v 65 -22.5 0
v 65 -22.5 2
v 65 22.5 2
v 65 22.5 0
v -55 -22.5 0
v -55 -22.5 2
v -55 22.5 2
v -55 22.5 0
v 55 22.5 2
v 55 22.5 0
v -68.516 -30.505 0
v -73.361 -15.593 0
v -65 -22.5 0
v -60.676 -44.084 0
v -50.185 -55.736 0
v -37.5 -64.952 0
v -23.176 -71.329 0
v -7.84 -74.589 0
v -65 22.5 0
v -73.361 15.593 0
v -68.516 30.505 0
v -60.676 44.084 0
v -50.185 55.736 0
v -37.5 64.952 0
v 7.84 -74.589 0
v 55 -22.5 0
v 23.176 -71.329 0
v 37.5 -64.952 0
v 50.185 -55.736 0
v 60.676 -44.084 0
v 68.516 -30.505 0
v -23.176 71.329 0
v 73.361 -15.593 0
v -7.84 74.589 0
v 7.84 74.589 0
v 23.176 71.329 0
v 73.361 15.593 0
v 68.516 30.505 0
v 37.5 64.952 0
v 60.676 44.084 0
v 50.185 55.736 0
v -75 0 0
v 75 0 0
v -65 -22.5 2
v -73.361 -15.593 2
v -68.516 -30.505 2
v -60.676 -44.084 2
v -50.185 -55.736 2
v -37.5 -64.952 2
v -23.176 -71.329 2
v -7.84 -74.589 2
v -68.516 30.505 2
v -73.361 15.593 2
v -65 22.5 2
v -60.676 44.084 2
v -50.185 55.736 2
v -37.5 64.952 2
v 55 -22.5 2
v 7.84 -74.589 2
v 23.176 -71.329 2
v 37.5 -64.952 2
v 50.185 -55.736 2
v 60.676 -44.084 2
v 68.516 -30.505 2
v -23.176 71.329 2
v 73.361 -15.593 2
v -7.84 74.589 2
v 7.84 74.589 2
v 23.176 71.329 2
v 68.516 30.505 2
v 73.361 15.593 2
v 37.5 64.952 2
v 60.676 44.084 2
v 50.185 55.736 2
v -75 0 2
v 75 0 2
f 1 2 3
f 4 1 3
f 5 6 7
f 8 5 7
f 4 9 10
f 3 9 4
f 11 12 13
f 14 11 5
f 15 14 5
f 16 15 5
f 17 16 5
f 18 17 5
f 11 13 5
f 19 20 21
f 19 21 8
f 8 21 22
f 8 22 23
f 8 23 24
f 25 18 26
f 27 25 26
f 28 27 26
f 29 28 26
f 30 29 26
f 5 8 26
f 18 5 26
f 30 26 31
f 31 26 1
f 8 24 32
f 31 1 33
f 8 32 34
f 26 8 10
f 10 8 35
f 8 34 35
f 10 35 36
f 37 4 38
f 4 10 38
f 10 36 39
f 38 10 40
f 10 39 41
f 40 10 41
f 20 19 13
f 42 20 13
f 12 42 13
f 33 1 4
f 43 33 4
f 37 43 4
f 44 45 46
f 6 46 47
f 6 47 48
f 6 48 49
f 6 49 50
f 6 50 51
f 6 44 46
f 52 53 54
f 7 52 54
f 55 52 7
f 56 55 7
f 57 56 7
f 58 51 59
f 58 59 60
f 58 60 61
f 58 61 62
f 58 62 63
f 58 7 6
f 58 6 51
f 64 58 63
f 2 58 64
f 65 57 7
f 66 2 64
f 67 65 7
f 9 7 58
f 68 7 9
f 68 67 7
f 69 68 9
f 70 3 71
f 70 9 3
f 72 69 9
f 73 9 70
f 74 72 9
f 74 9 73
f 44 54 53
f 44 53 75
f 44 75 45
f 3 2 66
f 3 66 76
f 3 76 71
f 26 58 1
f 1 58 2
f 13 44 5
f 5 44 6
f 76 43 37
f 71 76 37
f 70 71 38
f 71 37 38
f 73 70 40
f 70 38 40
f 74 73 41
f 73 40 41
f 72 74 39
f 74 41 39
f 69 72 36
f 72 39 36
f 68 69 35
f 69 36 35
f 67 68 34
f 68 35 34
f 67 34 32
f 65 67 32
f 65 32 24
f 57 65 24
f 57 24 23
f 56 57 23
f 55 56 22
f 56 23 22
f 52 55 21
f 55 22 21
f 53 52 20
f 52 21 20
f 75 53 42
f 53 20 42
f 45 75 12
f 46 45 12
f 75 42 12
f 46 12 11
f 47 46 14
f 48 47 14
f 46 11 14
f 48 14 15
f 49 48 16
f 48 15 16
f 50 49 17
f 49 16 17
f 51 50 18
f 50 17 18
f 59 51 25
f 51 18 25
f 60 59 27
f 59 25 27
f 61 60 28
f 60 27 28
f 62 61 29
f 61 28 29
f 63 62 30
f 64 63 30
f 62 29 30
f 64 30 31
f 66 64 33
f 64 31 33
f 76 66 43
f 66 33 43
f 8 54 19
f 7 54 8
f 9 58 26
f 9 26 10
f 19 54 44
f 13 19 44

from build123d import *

# Parameters (mm, degrees)
F0_R     = 75
F1_DEPTH = 2
F3_W     = 10
F3_H     = 22.5
F3_H_2   = 45
F4_DEPTH = 25


with BuildPart() as f1:
    # F0 (on Top) → F1 (new body)
    with BuildSketch(Plane.XY):
        Circle(F0_R)
    extrude(amount=F1_DEPTH)

    # F3 (on face) → F4 (cut)
    with BuildSketch(Plane.XY.offset(2)):
        with Locations((-60, -11.25)):
            Rectangle(F3_W, F3_H)
        with Locations((-60, 11.25)):
            Rectangle(F3_W, F3_H)
        with Locations((60, 0)):
            Rectangle(F3_W, F3_H_2)
    extrude(amount=-F4_DEPTH, mode=Mode.SUBTRACT)


solid = f1.part
